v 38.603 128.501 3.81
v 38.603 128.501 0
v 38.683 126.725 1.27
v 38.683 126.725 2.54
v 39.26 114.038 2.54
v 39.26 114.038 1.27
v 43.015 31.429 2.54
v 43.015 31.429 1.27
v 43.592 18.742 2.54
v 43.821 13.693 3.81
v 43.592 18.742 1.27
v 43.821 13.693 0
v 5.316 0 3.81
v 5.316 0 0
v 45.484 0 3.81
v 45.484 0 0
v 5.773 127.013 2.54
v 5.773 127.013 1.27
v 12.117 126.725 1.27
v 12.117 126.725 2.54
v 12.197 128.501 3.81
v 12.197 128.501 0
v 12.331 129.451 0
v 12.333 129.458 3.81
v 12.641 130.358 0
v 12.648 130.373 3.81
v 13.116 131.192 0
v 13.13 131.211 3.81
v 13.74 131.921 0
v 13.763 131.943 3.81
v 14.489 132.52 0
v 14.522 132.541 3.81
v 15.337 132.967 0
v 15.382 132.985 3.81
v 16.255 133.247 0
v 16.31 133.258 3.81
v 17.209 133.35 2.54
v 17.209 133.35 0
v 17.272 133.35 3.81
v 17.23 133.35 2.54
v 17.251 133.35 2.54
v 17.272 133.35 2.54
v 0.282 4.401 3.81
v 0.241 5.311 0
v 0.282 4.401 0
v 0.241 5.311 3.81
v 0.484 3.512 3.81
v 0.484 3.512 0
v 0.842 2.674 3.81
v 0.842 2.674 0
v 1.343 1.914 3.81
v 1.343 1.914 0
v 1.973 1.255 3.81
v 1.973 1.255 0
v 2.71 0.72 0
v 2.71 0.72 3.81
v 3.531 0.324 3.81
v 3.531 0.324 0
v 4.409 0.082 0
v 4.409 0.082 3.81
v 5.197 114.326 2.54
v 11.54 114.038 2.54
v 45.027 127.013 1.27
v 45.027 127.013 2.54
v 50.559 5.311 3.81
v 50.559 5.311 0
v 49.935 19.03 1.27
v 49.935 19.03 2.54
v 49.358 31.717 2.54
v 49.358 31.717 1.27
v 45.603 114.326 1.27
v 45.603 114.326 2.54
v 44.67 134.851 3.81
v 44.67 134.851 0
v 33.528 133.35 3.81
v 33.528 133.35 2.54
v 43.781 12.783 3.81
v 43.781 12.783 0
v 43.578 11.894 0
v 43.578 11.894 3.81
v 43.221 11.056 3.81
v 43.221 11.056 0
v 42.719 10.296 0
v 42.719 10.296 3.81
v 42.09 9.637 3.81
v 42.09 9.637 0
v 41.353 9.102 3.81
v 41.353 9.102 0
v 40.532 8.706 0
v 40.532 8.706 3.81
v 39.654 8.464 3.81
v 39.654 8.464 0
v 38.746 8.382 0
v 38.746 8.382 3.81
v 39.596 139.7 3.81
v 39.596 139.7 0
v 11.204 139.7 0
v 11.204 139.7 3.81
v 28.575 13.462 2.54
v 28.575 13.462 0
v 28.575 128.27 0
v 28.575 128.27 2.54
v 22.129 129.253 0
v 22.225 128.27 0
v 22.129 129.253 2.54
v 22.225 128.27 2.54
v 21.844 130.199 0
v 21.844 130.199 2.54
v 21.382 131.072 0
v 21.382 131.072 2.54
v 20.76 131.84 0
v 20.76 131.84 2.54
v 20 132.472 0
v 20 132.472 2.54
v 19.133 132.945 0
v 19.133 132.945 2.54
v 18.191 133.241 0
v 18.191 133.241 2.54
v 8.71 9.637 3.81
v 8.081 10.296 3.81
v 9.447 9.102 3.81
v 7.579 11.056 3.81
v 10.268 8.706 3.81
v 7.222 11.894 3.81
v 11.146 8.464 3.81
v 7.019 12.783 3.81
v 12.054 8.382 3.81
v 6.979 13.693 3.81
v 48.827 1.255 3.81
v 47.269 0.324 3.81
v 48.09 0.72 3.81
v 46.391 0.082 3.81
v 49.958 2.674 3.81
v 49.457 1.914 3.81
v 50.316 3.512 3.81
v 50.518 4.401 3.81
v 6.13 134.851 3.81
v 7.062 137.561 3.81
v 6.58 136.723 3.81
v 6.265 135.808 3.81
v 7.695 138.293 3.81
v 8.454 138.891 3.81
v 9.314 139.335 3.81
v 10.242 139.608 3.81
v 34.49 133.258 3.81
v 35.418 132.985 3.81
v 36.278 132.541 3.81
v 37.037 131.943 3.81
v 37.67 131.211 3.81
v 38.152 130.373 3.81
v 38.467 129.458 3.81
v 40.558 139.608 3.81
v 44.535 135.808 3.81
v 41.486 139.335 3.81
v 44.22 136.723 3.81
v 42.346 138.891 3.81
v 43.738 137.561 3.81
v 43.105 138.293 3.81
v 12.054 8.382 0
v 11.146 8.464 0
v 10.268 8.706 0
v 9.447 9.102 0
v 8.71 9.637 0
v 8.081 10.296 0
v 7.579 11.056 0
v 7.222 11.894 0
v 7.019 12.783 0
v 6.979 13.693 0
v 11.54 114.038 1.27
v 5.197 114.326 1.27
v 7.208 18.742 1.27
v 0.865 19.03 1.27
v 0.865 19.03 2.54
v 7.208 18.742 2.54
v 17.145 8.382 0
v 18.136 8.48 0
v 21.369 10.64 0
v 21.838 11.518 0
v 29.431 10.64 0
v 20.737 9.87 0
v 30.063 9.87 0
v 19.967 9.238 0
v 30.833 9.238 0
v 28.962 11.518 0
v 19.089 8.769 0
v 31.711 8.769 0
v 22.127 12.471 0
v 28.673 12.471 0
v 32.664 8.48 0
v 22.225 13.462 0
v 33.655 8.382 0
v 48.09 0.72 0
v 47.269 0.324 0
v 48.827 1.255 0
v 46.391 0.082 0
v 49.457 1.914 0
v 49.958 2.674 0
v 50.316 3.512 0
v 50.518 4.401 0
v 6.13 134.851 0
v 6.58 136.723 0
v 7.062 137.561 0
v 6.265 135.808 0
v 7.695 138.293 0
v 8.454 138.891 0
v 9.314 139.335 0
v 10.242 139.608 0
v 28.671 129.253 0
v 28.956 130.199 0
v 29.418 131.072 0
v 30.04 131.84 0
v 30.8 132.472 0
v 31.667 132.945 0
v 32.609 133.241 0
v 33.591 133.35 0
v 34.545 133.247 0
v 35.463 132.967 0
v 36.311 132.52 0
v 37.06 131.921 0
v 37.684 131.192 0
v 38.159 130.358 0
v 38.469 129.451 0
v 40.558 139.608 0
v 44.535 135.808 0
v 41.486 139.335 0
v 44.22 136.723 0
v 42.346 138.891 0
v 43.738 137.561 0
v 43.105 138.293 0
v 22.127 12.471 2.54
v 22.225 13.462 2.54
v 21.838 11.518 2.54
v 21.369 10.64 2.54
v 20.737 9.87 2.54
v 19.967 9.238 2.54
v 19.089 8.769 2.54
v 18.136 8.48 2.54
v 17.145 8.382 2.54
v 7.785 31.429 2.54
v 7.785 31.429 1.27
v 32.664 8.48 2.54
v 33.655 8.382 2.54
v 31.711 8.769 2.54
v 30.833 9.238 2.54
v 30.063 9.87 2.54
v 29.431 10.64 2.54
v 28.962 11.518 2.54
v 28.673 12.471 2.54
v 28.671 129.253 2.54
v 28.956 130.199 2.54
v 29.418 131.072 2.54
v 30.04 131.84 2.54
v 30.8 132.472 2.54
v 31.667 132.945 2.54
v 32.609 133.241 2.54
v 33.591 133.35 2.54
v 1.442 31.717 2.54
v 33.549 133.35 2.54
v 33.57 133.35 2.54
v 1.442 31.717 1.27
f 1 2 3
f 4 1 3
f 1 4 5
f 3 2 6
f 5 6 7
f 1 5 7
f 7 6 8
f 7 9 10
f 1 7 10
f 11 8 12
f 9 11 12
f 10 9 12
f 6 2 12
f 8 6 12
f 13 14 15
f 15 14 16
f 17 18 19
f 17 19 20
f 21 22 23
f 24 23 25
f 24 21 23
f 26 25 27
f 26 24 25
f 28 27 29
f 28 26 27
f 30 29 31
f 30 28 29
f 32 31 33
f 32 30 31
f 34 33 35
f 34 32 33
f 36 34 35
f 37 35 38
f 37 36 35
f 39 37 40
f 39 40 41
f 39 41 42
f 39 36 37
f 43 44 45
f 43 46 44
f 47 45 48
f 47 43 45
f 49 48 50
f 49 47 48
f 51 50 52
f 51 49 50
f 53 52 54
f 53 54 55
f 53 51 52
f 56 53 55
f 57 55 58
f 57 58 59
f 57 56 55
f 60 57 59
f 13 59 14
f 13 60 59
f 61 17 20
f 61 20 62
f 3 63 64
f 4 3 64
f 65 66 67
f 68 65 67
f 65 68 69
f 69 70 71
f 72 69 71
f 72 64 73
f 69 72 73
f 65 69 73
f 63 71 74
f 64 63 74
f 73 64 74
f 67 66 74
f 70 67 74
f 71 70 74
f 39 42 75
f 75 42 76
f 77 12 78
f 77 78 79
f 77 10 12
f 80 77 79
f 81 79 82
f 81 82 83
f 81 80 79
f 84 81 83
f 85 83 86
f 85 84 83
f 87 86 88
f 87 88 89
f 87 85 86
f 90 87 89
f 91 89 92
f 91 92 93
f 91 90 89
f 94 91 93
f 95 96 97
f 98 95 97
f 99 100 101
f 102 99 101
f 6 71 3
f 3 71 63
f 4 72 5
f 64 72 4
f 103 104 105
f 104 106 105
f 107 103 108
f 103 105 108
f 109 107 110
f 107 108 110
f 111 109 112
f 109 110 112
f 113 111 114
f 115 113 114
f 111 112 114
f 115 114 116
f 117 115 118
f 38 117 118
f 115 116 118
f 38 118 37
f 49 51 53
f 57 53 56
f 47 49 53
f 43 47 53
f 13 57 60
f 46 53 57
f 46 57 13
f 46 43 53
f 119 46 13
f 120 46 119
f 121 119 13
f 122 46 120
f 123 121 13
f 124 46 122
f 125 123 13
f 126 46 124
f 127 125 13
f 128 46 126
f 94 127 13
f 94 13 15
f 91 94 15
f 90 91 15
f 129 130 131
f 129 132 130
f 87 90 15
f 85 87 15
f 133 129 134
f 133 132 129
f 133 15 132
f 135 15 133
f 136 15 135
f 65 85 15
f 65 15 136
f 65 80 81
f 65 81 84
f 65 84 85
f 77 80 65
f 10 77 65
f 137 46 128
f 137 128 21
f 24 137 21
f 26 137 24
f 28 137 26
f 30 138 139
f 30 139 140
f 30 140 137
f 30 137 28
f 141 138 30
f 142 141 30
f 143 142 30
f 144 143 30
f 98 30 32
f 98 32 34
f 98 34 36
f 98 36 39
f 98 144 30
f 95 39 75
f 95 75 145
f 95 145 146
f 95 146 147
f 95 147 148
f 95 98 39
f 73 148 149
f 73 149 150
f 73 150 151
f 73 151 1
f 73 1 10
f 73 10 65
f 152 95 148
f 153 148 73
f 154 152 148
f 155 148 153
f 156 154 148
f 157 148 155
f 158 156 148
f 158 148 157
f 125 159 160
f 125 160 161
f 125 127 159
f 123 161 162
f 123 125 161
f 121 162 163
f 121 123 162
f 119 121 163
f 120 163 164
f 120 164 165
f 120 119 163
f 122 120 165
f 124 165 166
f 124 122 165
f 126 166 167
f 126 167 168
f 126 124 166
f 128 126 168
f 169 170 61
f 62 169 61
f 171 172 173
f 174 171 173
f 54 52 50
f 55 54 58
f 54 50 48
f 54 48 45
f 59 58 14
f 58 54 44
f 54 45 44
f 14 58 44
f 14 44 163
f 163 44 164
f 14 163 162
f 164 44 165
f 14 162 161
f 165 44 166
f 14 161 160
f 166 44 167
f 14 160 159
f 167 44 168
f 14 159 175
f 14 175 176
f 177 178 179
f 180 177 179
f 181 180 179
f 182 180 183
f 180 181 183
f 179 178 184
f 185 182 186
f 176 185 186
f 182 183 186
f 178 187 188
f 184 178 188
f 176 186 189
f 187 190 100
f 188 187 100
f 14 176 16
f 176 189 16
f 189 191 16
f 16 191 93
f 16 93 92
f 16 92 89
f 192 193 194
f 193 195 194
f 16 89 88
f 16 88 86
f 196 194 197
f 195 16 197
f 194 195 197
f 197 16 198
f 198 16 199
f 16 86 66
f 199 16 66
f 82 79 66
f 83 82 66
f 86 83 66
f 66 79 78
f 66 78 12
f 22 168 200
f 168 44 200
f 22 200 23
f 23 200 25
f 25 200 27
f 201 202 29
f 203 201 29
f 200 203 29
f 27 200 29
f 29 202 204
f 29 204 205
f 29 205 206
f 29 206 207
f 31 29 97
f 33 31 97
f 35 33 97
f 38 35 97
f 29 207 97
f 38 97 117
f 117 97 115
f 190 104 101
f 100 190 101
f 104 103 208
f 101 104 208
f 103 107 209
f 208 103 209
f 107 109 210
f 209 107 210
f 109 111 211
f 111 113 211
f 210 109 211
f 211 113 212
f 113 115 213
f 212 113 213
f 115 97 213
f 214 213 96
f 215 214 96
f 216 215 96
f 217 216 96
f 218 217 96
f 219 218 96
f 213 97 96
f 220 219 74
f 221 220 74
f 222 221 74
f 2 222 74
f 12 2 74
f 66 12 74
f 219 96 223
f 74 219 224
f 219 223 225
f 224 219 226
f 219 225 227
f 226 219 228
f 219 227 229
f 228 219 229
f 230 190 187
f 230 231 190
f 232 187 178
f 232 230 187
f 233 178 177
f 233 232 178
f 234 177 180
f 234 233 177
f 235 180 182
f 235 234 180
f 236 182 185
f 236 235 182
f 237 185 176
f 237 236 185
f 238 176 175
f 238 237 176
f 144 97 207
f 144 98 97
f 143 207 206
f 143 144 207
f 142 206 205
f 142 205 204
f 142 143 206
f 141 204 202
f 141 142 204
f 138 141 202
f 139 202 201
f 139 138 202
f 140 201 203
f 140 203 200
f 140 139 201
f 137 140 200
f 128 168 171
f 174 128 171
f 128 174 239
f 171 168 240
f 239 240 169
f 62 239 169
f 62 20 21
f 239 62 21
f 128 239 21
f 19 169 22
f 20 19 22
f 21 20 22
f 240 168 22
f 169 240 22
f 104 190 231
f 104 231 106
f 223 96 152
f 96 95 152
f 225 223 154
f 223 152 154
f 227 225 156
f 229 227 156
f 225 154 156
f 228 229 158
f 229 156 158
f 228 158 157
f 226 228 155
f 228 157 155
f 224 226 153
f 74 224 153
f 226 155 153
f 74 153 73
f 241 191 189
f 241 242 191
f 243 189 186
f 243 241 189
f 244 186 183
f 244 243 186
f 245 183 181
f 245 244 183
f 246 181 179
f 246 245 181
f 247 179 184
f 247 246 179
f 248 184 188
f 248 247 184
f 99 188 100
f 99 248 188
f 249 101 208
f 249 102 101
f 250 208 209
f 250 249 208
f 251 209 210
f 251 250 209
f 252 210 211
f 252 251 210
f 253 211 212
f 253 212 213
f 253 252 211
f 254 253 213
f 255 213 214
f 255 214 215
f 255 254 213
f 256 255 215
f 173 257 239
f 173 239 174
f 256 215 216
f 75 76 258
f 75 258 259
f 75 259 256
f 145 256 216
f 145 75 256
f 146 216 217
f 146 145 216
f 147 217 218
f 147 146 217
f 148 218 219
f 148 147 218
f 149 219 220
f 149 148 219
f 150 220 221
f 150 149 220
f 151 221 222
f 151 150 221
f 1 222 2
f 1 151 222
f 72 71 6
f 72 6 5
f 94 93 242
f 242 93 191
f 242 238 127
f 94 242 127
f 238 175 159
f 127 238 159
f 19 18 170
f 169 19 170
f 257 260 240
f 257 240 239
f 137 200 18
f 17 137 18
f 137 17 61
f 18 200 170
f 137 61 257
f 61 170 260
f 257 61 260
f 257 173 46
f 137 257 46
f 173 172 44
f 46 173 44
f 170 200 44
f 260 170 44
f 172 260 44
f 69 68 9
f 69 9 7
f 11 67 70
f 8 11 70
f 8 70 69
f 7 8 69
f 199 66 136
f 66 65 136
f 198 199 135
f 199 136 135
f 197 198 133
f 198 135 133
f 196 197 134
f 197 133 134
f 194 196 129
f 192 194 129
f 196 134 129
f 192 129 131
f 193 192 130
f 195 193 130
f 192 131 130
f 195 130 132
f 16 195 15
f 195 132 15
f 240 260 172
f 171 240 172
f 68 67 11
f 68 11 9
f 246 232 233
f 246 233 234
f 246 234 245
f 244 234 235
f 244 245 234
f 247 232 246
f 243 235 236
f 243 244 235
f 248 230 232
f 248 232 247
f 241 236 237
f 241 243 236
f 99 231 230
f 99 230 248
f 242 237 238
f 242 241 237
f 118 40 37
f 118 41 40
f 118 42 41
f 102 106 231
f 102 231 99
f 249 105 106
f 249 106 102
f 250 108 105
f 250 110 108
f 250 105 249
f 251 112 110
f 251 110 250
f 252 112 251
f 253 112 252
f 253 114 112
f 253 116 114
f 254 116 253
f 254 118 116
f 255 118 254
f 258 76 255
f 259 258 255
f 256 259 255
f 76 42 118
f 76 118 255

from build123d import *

# Parameters (mm, degrees)
F1_DEPTH = 3.81
F0_W     = 6.35
F0_H     = 124.968
F2_DEPTH = 2.54
F3_W     = 12.7
F3_H     = 1.27
F4_DEPTH = 6.35
F5_W     = 12.7
F5_H     = 1.27
F6_DEPTH = 6.35
F7_F1_R  = 5.08
F7_F2_R  = 5.08
F7_F3_R  = 5.08
F7_F4_R  = 5.08
F7_F5_R  = 5.08
F7_F6_R  = 5.08
F7_F7_R  = 5.08
F7_F8_R  = 5.08
F7_F9_R  = 5.08
F7_F10_R = 5.08
F7_F11_R = 5.08
F7_F12_R = 5.08


with BuildPart() as f1:
    # F0 (on Top) → F1 (new body)
    with BuildSketch(Plane.XY):
        Polygon((6.35, 139.7), (0, 0), (50.8, 0), (44.45, 139.7), align=None)
        Polygon((38.3820798312, 133.35), (44.0624434675, 8.382), (28.575, 8.382), (22.225, 8.382), (6.7375565325, 8.382), (12.4179201688, 133.35), (22.225, 133.35), (28.575, 133.35), align=None, mode=Mode.SUBTRACT)
    extrude(amount=F1_DEPTH)

    # F0 (on Top) → F2 (join)
    with BuildSketch(Plane.XY):
        with Locations((25.4, 70.866)):
            Rectangle(F0_W, F0_H)
    extrude(amount=F2_DEPTH)

    # F3 (on face) → F4 (cut)
    with BuildSketch(Plane(origin=(0, 0, 0), x_dir=(-0.0454076609, -0.9989685402, 0), z_dir=(-0.9989685402, 0.0454076609, 0))):
        with Locations((-120.7942437142, 1.905)):
            Rectangle(F3_W, F3_H)
        with Locations((-25.4, 1.905)):
            Rectangle(F3_W, F3_H)
    extrude(amount=-F4_DEPTH, mode=Mode.SUBTRACT)

    # F5 (on face) → F6 (cut)
    with BuildSketch(Plane(origin=(50.695257732, 2.3043298969, 0), x_dir=(-0.0454076609, 0.9989685402, 0), z_dir=(0.9989685402, 0.0454076609, 0))):
        with Locations((23.0932908253, 1.905)):
            Rectangle(F5_W, F5_H)
        with Locations((118.4875345395, 1.905)):
            Rectangle(F5_W, F5_H)
    extrude(amount=-F6_DEPTH, mode=Mode.SUBTRACT)

    # F7: fillet of radius 5.08 on 12 edges, made by hand

    # F7_f1
    f7_f1_edges = [f1.edges().sort_by_distance(p)[0] for p in [
        (28.575, 8.382, 1.27),
    ]]
    fillet(f7_f1_edges, radius=F7_F1_R)

    # F7_f2
    f7_f2_edges = [f1.edges().sort_by_distance(p)[0] for p in [
        (22.225, 8.382, 1.27),
    ]]
    fillet(f7_f2_edges, radius=F7_F2_R)

    # F7_f3
    f7_f3_edges = [f1.edges().sort_by_distance(p)[0] for p in [
        (28.575, 133.35, 1.27),
    ]]
    fillet(f7_f3_edges, radius=F7_F3_R)

    # F7_f4
    f7_f4_edges = [f1.edges().sort_by_distance(p)[0] for p in [
        (22.225, 133.35, 1.27),
    ]]
    fillet(f7_f4_edges, radius=F7_F4_R)

    # F7_f5
    f7_f5_edges = [f1.edges().sort_by_distance(p)[0] for p in [
        (6.35, 139.7, 1.905),
    ]]
    fillet(f7_f5_edges, radius=F7_F5_R)

    # F7_f6
    f7_f6_edges = [f1.edges().sort_by_distance(p)[0] for p in [
        (0, 0, 1.905),
    ]]
    fillet(f7_f6_edges, radius=F7_F6_R)

    # F7_f7
    f7_f7_edges = [f1.edges().sort_by_distance(p)[0] for p in [
        (44.45, 139.7, 1.905),
    ]]
    fillet(f7_f7_edges, radius=F7_F7_R)

    # F7_f8
    f7_f8_edges = [f1.edges().sort_by_distance(p)[0] for p in [
        (50.8, 0, 1.905),
    ]]
    fillet(f7_f8_edges, radius=F7_F8_R)

    # F7_f9
    f7_f9_edges = [f1.edges().sort_by_distance(p)[0] for p in [
        (38.3820798312, 133.35, 1.905),
    ]]
    fillet(f7_f9_edges, radius=F7_F9_R)

    # F7_f10
    f7_f10_edges = [f1.edges().sort_by_distance(p)[0] for p in [
        (44.0624434675, 8.382, 1.905),
    ]]
    fillet(f7_f10_edges, radius=F7_F10_R)

    # F7_f11
    f7_f11_edges = [f1.edges().sort_by_distance(p)[0] for p in [
        (6.7375565325, 8.382, 1.905),
    ]]
    fillet(f7_f11_edges, radius=F7_F11_R)

    # F7_f12
    f7_f12_edges = [f1.edges().sort_by_distance(p)[0] for p in [
        (12.4179201688, 133.35, 1.905),
    ]]
    fillet(f7_f12_edges, radius=F7_F12_R)


solid = f1.part
